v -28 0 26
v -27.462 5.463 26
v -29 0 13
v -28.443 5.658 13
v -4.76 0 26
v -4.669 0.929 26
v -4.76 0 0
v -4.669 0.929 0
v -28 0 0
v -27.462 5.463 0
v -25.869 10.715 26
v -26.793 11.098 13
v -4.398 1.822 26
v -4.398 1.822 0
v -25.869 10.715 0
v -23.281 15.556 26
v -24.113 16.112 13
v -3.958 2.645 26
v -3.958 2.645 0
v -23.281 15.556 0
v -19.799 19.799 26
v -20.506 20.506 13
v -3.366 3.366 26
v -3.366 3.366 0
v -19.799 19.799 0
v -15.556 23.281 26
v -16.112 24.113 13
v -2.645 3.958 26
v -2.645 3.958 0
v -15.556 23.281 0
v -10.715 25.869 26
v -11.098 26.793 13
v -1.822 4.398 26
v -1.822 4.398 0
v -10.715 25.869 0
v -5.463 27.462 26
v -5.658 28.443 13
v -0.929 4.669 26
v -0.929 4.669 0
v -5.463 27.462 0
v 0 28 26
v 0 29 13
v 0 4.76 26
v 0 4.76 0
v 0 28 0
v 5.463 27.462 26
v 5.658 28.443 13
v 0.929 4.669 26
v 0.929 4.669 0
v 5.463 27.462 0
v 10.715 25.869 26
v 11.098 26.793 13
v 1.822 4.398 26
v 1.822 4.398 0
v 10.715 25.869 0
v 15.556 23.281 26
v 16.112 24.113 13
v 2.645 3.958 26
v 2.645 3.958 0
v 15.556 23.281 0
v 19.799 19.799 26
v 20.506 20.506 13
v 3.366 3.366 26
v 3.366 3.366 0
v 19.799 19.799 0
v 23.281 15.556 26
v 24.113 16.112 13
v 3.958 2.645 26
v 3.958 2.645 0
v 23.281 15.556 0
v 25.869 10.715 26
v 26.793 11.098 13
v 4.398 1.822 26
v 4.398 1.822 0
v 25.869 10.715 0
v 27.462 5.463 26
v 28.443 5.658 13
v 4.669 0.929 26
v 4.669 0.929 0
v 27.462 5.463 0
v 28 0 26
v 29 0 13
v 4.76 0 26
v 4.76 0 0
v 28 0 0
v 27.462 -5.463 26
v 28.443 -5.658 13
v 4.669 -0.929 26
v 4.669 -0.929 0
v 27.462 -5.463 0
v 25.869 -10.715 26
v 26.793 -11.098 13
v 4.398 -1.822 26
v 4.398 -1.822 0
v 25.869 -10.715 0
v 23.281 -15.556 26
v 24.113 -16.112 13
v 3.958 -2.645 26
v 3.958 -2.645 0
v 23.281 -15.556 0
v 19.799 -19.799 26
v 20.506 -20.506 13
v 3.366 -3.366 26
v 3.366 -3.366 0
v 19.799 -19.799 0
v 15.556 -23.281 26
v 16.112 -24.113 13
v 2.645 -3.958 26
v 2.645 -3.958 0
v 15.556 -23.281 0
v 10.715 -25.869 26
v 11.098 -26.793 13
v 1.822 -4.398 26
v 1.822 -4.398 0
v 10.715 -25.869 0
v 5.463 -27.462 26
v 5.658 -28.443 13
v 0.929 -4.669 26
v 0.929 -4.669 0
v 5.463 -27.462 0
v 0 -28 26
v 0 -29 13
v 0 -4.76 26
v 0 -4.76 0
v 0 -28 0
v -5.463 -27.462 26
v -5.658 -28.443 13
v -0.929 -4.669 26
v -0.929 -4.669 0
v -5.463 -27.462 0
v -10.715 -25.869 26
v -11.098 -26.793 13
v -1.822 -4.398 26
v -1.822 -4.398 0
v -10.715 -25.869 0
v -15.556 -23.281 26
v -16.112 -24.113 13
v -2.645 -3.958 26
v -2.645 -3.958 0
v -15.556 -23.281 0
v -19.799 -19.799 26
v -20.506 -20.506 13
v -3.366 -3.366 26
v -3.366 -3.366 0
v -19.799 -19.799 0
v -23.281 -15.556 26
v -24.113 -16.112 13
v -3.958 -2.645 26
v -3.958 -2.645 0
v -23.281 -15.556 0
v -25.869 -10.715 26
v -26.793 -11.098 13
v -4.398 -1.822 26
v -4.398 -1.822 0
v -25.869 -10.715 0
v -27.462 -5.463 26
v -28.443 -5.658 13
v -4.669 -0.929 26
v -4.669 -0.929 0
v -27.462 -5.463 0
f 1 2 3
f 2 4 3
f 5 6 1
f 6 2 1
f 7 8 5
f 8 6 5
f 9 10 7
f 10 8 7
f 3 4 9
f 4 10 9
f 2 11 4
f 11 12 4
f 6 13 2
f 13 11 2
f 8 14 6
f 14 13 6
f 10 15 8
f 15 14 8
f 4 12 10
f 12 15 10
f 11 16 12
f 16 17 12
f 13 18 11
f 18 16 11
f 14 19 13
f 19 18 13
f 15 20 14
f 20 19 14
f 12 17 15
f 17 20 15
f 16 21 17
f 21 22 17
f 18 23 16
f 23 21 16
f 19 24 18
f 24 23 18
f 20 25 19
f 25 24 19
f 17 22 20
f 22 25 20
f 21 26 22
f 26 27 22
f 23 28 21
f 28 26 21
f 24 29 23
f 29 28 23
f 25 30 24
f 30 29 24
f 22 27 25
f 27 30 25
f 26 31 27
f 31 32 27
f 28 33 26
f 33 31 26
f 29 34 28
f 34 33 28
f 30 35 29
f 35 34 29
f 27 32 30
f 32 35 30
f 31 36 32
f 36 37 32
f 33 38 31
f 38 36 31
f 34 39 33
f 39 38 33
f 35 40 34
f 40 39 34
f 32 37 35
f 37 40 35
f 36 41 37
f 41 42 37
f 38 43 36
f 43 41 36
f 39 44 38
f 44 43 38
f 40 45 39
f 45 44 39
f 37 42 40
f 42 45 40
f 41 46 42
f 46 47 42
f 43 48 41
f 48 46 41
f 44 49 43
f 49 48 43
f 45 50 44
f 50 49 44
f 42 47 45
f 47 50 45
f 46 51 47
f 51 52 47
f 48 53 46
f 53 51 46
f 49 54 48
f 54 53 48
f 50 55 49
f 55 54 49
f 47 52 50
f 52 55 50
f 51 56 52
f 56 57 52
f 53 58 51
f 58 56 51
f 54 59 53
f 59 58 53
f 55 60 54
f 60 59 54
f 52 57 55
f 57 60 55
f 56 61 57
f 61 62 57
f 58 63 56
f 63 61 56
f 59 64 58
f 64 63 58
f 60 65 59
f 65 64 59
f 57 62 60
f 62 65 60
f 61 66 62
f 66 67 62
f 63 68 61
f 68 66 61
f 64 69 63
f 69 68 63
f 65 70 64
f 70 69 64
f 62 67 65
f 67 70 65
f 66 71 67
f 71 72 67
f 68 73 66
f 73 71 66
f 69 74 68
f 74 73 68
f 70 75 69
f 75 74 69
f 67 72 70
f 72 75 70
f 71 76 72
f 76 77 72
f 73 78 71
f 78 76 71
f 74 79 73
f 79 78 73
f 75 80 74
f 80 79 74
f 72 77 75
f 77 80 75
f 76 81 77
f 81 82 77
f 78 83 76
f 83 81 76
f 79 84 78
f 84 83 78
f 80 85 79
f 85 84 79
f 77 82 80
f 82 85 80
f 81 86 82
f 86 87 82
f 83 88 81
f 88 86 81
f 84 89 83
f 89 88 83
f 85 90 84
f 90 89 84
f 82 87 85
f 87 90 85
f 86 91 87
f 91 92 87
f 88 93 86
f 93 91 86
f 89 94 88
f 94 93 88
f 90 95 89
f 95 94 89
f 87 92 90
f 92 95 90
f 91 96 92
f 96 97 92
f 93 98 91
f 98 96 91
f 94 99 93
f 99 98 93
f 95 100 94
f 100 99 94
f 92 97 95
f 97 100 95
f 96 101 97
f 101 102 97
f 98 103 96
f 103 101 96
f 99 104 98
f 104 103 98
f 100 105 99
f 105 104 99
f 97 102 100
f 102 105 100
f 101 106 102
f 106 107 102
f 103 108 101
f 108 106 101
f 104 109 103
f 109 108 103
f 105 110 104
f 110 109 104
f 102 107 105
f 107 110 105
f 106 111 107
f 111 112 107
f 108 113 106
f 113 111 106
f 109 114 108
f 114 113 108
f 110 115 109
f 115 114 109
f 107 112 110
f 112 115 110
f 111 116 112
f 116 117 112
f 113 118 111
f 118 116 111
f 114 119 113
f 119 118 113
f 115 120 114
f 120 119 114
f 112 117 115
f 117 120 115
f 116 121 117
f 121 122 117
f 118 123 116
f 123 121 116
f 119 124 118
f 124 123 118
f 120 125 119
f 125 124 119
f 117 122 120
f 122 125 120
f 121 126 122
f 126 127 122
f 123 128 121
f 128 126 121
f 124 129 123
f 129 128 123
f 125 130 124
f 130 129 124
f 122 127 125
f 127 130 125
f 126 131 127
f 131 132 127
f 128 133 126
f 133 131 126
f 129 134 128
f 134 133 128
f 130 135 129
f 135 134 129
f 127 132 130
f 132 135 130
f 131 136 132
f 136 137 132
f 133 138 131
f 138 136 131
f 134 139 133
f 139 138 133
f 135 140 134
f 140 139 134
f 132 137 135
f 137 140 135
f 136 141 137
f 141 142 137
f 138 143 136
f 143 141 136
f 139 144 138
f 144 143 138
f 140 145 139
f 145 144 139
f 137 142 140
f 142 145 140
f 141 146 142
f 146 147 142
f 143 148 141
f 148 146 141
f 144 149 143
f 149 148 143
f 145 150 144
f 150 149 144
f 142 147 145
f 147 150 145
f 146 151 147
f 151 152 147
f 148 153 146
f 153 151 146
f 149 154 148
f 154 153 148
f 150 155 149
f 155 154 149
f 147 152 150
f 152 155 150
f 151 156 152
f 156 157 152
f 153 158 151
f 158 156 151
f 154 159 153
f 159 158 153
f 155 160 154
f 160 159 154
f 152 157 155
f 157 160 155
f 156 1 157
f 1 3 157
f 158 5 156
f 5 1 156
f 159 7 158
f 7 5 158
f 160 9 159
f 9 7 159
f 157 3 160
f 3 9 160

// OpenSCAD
$fn = 32;

// ----------------------------------------------------------------------
// Belt roller: 56 mm barrel, 26 mm wide, bore 9.52 mm
// ----------------------------------------------------------------------

// --- parameters (mm) ---
bore_d = 9.52;            // bore
barrel_d = 56;            // barrel diameter
roller_w = 26;            // roller width
crown = 1;                // crown height at mid width

roller_profile = [[4.76, 0], [28, 0], [29, 13], [28, 26], [4.76, 26]];

/* the profile stays clear of the axis, so the bore comes out of the revolve */
rotate_extrude() polygon(roller_profile);
